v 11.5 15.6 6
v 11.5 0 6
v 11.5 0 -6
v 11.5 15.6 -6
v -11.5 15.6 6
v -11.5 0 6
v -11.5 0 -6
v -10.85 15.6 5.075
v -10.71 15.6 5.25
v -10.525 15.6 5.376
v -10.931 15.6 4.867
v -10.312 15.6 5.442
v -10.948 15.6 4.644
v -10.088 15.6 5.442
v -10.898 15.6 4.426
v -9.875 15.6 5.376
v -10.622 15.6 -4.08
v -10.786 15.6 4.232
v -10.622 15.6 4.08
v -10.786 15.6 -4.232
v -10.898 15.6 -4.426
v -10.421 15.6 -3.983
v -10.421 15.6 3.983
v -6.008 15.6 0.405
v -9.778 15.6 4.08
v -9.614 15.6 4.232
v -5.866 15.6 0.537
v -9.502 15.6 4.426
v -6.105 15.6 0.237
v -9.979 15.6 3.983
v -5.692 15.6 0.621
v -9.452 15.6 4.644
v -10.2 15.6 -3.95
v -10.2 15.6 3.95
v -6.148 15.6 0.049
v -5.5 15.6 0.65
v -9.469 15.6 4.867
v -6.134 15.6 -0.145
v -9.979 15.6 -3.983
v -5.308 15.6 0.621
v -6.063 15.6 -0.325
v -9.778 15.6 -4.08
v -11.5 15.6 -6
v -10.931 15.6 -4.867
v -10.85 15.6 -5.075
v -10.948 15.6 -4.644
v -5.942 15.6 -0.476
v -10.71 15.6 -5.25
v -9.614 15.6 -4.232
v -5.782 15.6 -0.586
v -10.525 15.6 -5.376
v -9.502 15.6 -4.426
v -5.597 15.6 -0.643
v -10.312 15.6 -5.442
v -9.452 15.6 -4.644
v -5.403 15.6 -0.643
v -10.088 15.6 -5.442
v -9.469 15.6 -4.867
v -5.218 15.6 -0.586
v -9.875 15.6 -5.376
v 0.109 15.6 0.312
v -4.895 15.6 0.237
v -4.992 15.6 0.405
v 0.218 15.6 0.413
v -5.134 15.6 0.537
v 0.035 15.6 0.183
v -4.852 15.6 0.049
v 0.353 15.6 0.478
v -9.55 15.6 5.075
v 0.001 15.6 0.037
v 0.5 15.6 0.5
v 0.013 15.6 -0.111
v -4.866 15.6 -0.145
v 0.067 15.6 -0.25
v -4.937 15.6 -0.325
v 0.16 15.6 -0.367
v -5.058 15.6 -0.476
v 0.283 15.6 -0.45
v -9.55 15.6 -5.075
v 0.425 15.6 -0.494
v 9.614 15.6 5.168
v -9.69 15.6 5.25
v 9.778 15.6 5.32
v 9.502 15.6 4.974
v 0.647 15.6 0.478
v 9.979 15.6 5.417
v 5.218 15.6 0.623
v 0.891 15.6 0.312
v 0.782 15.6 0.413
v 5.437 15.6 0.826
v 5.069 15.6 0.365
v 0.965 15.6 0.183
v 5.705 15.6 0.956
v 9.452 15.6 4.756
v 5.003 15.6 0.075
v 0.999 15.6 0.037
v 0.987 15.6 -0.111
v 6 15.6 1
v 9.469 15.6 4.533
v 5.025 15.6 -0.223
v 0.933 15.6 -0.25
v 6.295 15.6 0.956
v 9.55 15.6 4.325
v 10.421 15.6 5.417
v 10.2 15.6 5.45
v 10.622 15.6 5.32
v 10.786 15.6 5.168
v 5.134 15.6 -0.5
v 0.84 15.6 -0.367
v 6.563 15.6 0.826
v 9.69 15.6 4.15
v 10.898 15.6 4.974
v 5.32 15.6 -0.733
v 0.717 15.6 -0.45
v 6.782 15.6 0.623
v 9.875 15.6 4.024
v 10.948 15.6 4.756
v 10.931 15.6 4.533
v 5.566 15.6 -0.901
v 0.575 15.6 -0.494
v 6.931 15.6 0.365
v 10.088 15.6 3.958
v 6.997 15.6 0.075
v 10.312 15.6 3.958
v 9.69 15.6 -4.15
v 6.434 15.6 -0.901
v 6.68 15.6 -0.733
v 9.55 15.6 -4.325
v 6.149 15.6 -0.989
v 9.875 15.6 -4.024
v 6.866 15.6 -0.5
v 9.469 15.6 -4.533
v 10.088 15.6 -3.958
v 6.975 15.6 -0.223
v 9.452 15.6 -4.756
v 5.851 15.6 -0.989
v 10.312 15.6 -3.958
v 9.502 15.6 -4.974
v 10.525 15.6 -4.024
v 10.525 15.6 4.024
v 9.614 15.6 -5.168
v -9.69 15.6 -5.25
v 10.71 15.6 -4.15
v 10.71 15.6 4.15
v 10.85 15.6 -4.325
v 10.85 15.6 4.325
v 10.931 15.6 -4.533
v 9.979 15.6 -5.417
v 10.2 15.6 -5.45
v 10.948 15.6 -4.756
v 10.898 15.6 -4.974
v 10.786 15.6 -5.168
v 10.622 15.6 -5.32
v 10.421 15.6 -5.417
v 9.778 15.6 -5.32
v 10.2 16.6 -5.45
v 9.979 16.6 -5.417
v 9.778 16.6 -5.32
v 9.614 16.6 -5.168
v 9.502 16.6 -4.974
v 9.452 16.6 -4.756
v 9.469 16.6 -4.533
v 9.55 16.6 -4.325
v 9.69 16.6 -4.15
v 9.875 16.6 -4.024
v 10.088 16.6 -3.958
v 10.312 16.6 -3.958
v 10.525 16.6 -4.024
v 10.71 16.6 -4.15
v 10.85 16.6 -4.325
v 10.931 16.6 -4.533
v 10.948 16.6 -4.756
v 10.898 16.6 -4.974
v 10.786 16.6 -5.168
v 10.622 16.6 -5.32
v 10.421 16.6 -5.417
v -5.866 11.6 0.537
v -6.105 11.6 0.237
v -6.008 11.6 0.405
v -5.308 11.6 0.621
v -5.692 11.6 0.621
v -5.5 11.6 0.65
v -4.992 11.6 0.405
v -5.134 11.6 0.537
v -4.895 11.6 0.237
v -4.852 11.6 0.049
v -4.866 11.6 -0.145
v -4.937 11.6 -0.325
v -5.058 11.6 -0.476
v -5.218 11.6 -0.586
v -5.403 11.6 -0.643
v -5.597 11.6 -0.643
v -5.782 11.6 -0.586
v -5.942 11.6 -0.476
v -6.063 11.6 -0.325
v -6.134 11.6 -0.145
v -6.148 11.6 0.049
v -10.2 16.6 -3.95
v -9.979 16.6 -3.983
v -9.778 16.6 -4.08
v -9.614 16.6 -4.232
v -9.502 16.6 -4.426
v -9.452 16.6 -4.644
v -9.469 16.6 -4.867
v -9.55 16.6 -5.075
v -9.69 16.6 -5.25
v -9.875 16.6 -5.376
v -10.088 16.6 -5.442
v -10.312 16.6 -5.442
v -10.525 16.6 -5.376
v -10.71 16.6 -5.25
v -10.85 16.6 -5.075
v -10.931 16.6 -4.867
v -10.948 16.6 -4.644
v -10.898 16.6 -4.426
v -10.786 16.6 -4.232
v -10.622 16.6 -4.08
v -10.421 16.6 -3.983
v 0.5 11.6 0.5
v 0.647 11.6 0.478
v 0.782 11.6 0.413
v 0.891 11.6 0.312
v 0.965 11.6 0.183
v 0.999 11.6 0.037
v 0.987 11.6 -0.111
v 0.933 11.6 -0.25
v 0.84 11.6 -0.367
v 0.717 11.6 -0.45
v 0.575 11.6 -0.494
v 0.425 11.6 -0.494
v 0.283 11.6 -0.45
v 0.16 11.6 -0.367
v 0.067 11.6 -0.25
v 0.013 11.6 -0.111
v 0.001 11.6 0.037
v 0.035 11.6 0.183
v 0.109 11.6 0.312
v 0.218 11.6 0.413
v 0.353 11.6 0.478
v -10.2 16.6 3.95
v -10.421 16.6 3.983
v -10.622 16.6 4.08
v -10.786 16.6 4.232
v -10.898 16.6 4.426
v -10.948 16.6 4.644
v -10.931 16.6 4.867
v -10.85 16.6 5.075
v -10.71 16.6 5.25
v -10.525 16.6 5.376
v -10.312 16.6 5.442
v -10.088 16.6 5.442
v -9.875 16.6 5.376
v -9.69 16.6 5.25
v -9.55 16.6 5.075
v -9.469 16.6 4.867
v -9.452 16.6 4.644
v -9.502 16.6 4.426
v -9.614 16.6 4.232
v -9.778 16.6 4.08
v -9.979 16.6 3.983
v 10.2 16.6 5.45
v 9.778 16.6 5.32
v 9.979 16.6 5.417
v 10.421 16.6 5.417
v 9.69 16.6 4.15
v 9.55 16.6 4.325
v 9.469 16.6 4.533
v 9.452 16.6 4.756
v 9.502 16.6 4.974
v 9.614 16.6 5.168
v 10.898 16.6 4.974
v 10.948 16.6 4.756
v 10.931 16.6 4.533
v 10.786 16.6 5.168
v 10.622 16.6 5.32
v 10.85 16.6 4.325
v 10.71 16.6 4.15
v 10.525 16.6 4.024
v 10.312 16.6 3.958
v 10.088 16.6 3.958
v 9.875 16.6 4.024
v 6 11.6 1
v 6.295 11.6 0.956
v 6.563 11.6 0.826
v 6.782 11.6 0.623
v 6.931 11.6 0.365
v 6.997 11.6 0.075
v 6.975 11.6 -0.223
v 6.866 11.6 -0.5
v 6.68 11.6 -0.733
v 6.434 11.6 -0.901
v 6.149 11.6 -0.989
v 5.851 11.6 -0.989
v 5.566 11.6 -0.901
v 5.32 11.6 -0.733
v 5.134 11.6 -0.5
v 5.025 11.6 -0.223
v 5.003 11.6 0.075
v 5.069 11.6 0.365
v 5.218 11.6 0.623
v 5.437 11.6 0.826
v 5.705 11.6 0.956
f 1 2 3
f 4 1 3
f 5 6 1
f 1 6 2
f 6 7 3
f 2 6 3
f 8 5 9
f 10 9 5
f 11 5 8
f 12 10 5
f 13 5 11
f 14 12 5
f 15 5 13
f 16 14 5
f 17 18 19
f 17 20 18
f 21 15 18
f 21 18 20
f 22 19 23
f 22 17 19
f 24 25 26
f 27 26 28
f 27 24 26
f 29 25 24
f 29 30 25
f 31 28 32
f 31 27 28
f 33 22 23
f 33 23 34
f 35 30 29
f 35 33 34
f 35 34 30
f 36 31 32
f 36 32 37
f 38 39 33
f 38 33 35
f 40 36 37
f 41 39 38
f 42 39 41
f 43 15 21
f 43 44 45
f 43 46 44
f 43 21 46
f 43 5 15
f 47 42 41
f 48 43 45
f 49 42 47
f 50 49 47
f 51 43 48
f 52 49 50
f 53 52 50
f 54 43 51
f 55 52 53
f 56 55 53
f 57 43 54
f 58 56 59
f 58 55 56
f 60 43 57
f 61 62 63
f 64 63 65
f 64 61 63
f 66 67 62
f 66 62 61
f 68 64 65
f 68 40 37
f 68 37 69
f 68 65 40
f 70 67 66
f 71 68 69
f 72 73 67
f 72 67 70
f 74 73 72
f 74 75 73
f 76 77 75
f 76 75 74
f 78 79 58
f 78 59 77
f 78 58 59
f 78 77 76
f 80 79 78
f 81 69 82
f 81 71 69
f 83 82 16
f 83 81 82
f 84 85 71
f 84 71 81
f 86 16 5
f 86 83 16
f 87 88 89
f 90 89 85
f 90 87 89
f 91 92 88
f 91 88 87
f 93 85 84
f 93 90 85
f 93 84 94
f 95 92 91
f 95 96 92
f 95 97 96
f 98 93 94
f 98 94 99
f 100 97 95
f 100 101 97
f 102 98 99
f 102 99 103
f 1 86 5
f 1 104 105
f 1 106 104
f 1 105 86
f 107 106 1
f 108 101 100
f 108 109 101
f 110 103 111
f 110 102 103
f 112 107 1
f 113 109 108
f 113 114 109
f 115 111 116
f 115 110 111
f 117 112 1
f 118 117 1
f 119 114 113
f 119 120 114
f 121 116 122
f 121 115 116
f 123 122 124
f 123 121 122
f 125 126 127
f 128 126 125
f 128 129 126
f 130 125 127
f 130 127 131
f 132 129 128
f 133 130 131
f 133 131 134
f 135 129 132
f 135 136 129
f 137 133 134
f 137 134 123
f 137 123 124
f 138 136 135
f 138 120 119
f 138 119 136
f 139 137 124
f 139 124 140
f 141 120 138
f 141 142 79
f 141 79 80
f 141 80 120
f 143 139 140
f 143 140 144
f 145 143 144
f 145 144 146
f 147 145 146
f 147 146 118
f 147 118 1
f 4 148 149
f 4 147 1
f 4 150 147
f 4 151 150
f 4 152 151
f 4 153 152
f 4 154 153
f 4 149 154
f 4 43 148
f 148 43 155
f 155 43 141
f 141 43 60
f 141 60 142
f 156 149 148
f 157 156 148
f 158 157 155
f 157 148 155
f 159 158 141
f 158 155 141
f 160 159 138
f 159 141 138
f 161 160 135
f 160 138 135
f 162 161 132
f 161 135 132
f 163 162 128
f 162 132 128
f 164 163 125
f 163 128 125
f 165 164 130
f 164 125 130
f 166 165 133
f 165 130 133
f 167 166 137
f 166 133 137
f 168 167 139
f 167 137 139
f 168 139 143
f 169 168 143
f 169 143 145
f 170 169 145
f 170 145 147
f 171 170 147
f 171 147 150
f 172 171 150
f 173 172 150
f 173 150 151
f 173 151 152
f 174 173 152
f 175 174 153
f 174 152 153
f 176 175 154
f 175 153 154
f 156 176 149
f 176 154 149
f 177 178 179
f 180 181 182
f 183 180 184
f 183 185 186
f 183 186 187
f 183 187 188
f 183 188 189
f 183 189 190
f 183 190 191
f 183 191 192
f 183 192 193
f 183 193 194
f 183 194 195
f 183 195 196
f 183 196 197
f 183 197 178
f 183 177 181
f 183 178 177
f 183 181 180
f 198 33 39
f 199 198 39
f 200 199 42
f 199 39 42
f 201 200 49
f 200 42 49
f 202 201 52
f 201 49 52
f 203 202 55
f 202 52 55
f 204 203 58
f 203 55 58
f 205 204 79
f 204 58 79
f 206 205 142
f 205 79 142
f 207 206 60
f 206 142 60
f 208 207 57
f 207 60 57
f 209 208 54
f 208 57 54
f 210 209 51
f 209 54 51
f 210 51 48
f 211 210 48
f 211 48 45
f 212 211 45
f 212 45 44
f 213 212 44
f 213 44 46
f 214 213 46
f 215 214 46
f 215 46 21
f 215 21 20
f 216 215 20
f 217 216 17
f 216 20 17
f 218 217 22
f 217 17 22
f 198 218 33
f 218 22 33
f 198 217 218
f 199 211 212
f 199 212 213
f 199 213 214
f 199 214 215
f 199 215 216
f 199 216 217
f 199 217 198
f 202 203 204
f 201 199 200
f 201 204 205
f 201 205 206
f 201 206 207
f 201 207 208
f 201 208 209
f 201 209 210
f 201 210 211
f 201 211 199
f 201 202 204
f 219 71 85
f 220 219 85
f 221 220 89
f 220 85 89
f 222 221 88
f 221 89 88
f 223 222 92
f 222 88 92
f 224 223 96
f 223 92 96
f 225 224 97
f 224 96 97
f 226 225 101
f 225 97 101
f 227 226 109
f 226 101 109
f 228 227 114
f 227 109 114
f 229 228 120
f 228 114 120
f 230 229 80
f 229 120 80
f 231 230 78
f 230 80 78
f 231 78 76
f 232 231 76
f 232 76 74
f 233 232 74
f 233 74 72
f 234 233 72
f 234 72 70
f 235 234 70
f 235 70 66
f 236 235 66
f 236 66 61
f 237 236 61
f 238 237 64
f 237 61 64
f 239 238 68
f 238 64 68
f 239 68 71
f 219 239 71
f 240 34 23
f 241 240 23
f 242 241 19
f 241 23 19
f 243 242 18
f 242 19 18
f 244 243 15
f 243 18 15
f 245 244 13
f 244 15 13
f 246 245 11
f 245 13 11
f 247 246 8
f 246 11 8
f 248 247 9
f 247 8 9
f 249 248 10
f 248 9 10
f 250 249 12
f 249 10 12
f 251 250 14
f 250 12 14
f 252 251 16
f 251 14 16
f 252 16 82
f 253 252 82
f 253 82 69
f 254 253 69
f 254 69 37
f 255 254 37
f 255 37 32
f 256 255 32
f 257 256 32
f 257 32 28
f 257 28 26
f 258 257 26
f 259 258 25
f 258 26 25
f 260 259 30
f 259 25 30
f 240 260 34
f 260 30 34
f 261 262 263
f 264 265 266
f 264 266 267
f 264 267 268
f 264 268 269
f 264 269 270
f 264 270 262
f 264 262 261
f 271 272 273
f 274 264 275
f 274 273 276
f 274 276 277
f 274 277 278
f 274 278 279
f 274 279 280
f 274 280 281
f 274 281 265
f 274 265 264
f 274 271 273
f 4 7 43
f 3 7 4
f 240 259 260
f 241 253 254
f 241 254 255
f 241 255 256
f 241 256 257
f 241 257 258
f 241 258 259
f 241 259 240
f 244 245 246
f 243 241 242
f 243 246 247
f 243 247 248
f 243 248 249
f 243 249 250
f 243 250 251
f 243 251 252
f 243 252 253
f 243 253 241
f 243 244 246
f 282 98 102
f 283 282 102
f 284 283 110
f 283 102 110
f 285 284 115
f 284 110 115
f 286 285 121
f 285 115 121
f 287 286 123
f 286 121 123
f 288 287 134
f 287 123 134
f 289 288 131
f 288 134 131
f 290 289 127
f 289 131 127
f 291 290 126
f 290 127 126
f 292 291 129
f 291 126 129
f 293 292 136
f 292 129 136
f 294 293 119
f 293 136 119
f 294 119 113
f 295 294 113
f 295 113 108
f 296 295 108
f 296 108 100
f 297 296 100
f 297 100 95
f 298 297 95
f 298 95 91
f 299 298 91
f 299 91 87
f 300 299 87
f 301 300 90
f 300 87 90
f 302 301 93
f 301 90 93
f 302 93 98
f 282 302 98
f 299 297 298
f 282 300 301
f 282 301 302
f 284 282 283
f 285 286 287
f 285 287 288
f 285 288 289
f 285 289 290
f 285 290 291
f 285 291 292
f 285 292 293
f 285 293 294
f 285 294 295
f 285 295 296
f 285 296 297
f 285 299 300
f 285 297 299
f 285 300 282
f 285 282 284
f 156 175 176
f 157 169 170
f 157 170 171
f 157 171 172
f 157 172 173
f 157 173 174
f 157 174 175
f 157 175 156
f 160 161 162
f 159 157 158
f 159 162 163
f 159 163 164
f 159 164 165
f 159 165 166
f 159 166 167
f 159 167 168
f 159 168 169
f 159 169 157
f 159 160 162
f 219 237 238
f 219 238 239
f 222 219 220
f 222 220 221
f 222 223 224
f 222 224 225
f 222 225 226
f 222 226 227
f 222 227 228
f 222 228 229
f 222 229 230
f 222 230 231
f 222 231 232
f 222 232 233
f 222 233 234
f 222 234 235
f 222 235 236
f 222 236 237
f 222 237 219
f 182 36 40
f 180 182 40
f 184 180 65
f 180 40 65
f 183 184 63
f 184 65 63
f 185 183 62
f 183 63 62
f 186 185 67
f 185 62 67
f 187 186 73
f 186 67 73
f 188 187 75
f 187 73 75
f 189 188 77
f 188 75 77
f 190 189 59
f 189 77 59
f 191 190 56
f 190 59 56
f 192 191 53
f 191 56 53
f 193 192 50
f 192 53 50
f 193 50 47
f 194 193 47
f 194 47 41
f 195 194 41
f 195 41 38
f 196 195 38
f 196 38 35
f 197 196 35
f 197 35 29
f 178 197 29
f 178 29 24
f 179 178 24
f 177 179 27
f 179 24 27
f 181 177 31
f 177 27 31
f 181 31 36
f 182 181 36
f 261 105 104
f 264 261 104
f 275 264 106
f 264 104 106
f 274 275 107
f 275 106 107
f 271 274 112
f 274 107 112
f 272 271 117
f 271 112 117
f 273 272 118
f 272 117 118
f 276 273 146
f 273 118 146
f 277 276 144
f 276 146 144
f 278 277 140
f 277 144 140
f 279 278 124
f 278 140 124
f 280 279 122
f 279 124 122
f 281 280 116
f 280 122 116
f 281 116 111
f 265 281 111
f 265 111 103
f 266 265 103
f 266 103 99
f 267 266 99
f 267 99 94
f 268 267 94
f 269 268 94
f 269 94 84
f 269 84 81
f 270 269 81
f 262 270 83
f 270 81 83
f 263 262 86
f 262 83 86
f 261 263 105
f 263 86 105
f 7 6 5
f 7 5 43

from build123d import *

# Parameters (mm, degrees)
SKETCH1_W           = 23
SKETCH1_H           = 12
BOSS_EXTRUDE1_DEPTH = 15.6
SKETCH2_R           = 0.75
BOSS_EXTRUDE2_DEPTH = 1
SKETCH3_R           = 1
SKETCH3_R_2         = 0.5
SKETCH3_R_3         = 0.65
CUT_EXTRUDE1_DEPTH  = 4


with BuildPart() as part:
    # Sketch1 → Boss-Extrude1 (new body)
    with BuildSketch(Plane(origin=(0, 0, 0), x_dir=(1, 0, 0), z_dir=(0, 1, 0))):
        Rectangle(SKETCH1_W, SKETCH1_H)
    extrude(amount=BOSS_EXTRUDE1_DEPTH)

    # Sketch2 → Boss-Extrude2 (add)
    with BuildSketch(Plane(origin=(0, 15.6, 0), x_dir=(1, 0, 0), z_dir=(0, 1, 0))):
        with Locations(Location((-10.2, 4.7, 0), (0, 0, 270))):
            Circle(SKETCH2_R)
        with Locations(Location((10.2, 4.7, 0), (0, 0, 90))):
            Circle(SKETCH2_R)
        with Locations(Location((10.2, -4.7, 0), (0, 0, 270))):
            Circle(SKETCH2_R)
        with Locations(Location((-10.2, -4.7, 0), (0, 0, 90))):
            Circle(SKETCH2_R)
    extrude(amount=BOSS_EXTRUDE2_DEPTH)

    # Sketch3 → Cut-Extrude1 (cut)
    with BuildSketch(Plane(origin=(0, 15.6, 0), x_dir=(1, 0, 0), z_dir=(0, 1, 0))):
        with Locations(Location((6, 0, 0), (0, 0, 270))):
            Circle(SKETCH3_R)
        with Locations(Location((0.5, 0, 0), (0, 0, 270))):
            Circle(SKETCH3_R_2)
        with Locations(Location((-5.5, 0, 0), (0, 0, 270))):
            Circle(SKETCH3_R_3)
    extrude(amount=-CUT_EXTRUDE1_DEPTH, mode=Mode.SUBTRACT)


solid = part.part
